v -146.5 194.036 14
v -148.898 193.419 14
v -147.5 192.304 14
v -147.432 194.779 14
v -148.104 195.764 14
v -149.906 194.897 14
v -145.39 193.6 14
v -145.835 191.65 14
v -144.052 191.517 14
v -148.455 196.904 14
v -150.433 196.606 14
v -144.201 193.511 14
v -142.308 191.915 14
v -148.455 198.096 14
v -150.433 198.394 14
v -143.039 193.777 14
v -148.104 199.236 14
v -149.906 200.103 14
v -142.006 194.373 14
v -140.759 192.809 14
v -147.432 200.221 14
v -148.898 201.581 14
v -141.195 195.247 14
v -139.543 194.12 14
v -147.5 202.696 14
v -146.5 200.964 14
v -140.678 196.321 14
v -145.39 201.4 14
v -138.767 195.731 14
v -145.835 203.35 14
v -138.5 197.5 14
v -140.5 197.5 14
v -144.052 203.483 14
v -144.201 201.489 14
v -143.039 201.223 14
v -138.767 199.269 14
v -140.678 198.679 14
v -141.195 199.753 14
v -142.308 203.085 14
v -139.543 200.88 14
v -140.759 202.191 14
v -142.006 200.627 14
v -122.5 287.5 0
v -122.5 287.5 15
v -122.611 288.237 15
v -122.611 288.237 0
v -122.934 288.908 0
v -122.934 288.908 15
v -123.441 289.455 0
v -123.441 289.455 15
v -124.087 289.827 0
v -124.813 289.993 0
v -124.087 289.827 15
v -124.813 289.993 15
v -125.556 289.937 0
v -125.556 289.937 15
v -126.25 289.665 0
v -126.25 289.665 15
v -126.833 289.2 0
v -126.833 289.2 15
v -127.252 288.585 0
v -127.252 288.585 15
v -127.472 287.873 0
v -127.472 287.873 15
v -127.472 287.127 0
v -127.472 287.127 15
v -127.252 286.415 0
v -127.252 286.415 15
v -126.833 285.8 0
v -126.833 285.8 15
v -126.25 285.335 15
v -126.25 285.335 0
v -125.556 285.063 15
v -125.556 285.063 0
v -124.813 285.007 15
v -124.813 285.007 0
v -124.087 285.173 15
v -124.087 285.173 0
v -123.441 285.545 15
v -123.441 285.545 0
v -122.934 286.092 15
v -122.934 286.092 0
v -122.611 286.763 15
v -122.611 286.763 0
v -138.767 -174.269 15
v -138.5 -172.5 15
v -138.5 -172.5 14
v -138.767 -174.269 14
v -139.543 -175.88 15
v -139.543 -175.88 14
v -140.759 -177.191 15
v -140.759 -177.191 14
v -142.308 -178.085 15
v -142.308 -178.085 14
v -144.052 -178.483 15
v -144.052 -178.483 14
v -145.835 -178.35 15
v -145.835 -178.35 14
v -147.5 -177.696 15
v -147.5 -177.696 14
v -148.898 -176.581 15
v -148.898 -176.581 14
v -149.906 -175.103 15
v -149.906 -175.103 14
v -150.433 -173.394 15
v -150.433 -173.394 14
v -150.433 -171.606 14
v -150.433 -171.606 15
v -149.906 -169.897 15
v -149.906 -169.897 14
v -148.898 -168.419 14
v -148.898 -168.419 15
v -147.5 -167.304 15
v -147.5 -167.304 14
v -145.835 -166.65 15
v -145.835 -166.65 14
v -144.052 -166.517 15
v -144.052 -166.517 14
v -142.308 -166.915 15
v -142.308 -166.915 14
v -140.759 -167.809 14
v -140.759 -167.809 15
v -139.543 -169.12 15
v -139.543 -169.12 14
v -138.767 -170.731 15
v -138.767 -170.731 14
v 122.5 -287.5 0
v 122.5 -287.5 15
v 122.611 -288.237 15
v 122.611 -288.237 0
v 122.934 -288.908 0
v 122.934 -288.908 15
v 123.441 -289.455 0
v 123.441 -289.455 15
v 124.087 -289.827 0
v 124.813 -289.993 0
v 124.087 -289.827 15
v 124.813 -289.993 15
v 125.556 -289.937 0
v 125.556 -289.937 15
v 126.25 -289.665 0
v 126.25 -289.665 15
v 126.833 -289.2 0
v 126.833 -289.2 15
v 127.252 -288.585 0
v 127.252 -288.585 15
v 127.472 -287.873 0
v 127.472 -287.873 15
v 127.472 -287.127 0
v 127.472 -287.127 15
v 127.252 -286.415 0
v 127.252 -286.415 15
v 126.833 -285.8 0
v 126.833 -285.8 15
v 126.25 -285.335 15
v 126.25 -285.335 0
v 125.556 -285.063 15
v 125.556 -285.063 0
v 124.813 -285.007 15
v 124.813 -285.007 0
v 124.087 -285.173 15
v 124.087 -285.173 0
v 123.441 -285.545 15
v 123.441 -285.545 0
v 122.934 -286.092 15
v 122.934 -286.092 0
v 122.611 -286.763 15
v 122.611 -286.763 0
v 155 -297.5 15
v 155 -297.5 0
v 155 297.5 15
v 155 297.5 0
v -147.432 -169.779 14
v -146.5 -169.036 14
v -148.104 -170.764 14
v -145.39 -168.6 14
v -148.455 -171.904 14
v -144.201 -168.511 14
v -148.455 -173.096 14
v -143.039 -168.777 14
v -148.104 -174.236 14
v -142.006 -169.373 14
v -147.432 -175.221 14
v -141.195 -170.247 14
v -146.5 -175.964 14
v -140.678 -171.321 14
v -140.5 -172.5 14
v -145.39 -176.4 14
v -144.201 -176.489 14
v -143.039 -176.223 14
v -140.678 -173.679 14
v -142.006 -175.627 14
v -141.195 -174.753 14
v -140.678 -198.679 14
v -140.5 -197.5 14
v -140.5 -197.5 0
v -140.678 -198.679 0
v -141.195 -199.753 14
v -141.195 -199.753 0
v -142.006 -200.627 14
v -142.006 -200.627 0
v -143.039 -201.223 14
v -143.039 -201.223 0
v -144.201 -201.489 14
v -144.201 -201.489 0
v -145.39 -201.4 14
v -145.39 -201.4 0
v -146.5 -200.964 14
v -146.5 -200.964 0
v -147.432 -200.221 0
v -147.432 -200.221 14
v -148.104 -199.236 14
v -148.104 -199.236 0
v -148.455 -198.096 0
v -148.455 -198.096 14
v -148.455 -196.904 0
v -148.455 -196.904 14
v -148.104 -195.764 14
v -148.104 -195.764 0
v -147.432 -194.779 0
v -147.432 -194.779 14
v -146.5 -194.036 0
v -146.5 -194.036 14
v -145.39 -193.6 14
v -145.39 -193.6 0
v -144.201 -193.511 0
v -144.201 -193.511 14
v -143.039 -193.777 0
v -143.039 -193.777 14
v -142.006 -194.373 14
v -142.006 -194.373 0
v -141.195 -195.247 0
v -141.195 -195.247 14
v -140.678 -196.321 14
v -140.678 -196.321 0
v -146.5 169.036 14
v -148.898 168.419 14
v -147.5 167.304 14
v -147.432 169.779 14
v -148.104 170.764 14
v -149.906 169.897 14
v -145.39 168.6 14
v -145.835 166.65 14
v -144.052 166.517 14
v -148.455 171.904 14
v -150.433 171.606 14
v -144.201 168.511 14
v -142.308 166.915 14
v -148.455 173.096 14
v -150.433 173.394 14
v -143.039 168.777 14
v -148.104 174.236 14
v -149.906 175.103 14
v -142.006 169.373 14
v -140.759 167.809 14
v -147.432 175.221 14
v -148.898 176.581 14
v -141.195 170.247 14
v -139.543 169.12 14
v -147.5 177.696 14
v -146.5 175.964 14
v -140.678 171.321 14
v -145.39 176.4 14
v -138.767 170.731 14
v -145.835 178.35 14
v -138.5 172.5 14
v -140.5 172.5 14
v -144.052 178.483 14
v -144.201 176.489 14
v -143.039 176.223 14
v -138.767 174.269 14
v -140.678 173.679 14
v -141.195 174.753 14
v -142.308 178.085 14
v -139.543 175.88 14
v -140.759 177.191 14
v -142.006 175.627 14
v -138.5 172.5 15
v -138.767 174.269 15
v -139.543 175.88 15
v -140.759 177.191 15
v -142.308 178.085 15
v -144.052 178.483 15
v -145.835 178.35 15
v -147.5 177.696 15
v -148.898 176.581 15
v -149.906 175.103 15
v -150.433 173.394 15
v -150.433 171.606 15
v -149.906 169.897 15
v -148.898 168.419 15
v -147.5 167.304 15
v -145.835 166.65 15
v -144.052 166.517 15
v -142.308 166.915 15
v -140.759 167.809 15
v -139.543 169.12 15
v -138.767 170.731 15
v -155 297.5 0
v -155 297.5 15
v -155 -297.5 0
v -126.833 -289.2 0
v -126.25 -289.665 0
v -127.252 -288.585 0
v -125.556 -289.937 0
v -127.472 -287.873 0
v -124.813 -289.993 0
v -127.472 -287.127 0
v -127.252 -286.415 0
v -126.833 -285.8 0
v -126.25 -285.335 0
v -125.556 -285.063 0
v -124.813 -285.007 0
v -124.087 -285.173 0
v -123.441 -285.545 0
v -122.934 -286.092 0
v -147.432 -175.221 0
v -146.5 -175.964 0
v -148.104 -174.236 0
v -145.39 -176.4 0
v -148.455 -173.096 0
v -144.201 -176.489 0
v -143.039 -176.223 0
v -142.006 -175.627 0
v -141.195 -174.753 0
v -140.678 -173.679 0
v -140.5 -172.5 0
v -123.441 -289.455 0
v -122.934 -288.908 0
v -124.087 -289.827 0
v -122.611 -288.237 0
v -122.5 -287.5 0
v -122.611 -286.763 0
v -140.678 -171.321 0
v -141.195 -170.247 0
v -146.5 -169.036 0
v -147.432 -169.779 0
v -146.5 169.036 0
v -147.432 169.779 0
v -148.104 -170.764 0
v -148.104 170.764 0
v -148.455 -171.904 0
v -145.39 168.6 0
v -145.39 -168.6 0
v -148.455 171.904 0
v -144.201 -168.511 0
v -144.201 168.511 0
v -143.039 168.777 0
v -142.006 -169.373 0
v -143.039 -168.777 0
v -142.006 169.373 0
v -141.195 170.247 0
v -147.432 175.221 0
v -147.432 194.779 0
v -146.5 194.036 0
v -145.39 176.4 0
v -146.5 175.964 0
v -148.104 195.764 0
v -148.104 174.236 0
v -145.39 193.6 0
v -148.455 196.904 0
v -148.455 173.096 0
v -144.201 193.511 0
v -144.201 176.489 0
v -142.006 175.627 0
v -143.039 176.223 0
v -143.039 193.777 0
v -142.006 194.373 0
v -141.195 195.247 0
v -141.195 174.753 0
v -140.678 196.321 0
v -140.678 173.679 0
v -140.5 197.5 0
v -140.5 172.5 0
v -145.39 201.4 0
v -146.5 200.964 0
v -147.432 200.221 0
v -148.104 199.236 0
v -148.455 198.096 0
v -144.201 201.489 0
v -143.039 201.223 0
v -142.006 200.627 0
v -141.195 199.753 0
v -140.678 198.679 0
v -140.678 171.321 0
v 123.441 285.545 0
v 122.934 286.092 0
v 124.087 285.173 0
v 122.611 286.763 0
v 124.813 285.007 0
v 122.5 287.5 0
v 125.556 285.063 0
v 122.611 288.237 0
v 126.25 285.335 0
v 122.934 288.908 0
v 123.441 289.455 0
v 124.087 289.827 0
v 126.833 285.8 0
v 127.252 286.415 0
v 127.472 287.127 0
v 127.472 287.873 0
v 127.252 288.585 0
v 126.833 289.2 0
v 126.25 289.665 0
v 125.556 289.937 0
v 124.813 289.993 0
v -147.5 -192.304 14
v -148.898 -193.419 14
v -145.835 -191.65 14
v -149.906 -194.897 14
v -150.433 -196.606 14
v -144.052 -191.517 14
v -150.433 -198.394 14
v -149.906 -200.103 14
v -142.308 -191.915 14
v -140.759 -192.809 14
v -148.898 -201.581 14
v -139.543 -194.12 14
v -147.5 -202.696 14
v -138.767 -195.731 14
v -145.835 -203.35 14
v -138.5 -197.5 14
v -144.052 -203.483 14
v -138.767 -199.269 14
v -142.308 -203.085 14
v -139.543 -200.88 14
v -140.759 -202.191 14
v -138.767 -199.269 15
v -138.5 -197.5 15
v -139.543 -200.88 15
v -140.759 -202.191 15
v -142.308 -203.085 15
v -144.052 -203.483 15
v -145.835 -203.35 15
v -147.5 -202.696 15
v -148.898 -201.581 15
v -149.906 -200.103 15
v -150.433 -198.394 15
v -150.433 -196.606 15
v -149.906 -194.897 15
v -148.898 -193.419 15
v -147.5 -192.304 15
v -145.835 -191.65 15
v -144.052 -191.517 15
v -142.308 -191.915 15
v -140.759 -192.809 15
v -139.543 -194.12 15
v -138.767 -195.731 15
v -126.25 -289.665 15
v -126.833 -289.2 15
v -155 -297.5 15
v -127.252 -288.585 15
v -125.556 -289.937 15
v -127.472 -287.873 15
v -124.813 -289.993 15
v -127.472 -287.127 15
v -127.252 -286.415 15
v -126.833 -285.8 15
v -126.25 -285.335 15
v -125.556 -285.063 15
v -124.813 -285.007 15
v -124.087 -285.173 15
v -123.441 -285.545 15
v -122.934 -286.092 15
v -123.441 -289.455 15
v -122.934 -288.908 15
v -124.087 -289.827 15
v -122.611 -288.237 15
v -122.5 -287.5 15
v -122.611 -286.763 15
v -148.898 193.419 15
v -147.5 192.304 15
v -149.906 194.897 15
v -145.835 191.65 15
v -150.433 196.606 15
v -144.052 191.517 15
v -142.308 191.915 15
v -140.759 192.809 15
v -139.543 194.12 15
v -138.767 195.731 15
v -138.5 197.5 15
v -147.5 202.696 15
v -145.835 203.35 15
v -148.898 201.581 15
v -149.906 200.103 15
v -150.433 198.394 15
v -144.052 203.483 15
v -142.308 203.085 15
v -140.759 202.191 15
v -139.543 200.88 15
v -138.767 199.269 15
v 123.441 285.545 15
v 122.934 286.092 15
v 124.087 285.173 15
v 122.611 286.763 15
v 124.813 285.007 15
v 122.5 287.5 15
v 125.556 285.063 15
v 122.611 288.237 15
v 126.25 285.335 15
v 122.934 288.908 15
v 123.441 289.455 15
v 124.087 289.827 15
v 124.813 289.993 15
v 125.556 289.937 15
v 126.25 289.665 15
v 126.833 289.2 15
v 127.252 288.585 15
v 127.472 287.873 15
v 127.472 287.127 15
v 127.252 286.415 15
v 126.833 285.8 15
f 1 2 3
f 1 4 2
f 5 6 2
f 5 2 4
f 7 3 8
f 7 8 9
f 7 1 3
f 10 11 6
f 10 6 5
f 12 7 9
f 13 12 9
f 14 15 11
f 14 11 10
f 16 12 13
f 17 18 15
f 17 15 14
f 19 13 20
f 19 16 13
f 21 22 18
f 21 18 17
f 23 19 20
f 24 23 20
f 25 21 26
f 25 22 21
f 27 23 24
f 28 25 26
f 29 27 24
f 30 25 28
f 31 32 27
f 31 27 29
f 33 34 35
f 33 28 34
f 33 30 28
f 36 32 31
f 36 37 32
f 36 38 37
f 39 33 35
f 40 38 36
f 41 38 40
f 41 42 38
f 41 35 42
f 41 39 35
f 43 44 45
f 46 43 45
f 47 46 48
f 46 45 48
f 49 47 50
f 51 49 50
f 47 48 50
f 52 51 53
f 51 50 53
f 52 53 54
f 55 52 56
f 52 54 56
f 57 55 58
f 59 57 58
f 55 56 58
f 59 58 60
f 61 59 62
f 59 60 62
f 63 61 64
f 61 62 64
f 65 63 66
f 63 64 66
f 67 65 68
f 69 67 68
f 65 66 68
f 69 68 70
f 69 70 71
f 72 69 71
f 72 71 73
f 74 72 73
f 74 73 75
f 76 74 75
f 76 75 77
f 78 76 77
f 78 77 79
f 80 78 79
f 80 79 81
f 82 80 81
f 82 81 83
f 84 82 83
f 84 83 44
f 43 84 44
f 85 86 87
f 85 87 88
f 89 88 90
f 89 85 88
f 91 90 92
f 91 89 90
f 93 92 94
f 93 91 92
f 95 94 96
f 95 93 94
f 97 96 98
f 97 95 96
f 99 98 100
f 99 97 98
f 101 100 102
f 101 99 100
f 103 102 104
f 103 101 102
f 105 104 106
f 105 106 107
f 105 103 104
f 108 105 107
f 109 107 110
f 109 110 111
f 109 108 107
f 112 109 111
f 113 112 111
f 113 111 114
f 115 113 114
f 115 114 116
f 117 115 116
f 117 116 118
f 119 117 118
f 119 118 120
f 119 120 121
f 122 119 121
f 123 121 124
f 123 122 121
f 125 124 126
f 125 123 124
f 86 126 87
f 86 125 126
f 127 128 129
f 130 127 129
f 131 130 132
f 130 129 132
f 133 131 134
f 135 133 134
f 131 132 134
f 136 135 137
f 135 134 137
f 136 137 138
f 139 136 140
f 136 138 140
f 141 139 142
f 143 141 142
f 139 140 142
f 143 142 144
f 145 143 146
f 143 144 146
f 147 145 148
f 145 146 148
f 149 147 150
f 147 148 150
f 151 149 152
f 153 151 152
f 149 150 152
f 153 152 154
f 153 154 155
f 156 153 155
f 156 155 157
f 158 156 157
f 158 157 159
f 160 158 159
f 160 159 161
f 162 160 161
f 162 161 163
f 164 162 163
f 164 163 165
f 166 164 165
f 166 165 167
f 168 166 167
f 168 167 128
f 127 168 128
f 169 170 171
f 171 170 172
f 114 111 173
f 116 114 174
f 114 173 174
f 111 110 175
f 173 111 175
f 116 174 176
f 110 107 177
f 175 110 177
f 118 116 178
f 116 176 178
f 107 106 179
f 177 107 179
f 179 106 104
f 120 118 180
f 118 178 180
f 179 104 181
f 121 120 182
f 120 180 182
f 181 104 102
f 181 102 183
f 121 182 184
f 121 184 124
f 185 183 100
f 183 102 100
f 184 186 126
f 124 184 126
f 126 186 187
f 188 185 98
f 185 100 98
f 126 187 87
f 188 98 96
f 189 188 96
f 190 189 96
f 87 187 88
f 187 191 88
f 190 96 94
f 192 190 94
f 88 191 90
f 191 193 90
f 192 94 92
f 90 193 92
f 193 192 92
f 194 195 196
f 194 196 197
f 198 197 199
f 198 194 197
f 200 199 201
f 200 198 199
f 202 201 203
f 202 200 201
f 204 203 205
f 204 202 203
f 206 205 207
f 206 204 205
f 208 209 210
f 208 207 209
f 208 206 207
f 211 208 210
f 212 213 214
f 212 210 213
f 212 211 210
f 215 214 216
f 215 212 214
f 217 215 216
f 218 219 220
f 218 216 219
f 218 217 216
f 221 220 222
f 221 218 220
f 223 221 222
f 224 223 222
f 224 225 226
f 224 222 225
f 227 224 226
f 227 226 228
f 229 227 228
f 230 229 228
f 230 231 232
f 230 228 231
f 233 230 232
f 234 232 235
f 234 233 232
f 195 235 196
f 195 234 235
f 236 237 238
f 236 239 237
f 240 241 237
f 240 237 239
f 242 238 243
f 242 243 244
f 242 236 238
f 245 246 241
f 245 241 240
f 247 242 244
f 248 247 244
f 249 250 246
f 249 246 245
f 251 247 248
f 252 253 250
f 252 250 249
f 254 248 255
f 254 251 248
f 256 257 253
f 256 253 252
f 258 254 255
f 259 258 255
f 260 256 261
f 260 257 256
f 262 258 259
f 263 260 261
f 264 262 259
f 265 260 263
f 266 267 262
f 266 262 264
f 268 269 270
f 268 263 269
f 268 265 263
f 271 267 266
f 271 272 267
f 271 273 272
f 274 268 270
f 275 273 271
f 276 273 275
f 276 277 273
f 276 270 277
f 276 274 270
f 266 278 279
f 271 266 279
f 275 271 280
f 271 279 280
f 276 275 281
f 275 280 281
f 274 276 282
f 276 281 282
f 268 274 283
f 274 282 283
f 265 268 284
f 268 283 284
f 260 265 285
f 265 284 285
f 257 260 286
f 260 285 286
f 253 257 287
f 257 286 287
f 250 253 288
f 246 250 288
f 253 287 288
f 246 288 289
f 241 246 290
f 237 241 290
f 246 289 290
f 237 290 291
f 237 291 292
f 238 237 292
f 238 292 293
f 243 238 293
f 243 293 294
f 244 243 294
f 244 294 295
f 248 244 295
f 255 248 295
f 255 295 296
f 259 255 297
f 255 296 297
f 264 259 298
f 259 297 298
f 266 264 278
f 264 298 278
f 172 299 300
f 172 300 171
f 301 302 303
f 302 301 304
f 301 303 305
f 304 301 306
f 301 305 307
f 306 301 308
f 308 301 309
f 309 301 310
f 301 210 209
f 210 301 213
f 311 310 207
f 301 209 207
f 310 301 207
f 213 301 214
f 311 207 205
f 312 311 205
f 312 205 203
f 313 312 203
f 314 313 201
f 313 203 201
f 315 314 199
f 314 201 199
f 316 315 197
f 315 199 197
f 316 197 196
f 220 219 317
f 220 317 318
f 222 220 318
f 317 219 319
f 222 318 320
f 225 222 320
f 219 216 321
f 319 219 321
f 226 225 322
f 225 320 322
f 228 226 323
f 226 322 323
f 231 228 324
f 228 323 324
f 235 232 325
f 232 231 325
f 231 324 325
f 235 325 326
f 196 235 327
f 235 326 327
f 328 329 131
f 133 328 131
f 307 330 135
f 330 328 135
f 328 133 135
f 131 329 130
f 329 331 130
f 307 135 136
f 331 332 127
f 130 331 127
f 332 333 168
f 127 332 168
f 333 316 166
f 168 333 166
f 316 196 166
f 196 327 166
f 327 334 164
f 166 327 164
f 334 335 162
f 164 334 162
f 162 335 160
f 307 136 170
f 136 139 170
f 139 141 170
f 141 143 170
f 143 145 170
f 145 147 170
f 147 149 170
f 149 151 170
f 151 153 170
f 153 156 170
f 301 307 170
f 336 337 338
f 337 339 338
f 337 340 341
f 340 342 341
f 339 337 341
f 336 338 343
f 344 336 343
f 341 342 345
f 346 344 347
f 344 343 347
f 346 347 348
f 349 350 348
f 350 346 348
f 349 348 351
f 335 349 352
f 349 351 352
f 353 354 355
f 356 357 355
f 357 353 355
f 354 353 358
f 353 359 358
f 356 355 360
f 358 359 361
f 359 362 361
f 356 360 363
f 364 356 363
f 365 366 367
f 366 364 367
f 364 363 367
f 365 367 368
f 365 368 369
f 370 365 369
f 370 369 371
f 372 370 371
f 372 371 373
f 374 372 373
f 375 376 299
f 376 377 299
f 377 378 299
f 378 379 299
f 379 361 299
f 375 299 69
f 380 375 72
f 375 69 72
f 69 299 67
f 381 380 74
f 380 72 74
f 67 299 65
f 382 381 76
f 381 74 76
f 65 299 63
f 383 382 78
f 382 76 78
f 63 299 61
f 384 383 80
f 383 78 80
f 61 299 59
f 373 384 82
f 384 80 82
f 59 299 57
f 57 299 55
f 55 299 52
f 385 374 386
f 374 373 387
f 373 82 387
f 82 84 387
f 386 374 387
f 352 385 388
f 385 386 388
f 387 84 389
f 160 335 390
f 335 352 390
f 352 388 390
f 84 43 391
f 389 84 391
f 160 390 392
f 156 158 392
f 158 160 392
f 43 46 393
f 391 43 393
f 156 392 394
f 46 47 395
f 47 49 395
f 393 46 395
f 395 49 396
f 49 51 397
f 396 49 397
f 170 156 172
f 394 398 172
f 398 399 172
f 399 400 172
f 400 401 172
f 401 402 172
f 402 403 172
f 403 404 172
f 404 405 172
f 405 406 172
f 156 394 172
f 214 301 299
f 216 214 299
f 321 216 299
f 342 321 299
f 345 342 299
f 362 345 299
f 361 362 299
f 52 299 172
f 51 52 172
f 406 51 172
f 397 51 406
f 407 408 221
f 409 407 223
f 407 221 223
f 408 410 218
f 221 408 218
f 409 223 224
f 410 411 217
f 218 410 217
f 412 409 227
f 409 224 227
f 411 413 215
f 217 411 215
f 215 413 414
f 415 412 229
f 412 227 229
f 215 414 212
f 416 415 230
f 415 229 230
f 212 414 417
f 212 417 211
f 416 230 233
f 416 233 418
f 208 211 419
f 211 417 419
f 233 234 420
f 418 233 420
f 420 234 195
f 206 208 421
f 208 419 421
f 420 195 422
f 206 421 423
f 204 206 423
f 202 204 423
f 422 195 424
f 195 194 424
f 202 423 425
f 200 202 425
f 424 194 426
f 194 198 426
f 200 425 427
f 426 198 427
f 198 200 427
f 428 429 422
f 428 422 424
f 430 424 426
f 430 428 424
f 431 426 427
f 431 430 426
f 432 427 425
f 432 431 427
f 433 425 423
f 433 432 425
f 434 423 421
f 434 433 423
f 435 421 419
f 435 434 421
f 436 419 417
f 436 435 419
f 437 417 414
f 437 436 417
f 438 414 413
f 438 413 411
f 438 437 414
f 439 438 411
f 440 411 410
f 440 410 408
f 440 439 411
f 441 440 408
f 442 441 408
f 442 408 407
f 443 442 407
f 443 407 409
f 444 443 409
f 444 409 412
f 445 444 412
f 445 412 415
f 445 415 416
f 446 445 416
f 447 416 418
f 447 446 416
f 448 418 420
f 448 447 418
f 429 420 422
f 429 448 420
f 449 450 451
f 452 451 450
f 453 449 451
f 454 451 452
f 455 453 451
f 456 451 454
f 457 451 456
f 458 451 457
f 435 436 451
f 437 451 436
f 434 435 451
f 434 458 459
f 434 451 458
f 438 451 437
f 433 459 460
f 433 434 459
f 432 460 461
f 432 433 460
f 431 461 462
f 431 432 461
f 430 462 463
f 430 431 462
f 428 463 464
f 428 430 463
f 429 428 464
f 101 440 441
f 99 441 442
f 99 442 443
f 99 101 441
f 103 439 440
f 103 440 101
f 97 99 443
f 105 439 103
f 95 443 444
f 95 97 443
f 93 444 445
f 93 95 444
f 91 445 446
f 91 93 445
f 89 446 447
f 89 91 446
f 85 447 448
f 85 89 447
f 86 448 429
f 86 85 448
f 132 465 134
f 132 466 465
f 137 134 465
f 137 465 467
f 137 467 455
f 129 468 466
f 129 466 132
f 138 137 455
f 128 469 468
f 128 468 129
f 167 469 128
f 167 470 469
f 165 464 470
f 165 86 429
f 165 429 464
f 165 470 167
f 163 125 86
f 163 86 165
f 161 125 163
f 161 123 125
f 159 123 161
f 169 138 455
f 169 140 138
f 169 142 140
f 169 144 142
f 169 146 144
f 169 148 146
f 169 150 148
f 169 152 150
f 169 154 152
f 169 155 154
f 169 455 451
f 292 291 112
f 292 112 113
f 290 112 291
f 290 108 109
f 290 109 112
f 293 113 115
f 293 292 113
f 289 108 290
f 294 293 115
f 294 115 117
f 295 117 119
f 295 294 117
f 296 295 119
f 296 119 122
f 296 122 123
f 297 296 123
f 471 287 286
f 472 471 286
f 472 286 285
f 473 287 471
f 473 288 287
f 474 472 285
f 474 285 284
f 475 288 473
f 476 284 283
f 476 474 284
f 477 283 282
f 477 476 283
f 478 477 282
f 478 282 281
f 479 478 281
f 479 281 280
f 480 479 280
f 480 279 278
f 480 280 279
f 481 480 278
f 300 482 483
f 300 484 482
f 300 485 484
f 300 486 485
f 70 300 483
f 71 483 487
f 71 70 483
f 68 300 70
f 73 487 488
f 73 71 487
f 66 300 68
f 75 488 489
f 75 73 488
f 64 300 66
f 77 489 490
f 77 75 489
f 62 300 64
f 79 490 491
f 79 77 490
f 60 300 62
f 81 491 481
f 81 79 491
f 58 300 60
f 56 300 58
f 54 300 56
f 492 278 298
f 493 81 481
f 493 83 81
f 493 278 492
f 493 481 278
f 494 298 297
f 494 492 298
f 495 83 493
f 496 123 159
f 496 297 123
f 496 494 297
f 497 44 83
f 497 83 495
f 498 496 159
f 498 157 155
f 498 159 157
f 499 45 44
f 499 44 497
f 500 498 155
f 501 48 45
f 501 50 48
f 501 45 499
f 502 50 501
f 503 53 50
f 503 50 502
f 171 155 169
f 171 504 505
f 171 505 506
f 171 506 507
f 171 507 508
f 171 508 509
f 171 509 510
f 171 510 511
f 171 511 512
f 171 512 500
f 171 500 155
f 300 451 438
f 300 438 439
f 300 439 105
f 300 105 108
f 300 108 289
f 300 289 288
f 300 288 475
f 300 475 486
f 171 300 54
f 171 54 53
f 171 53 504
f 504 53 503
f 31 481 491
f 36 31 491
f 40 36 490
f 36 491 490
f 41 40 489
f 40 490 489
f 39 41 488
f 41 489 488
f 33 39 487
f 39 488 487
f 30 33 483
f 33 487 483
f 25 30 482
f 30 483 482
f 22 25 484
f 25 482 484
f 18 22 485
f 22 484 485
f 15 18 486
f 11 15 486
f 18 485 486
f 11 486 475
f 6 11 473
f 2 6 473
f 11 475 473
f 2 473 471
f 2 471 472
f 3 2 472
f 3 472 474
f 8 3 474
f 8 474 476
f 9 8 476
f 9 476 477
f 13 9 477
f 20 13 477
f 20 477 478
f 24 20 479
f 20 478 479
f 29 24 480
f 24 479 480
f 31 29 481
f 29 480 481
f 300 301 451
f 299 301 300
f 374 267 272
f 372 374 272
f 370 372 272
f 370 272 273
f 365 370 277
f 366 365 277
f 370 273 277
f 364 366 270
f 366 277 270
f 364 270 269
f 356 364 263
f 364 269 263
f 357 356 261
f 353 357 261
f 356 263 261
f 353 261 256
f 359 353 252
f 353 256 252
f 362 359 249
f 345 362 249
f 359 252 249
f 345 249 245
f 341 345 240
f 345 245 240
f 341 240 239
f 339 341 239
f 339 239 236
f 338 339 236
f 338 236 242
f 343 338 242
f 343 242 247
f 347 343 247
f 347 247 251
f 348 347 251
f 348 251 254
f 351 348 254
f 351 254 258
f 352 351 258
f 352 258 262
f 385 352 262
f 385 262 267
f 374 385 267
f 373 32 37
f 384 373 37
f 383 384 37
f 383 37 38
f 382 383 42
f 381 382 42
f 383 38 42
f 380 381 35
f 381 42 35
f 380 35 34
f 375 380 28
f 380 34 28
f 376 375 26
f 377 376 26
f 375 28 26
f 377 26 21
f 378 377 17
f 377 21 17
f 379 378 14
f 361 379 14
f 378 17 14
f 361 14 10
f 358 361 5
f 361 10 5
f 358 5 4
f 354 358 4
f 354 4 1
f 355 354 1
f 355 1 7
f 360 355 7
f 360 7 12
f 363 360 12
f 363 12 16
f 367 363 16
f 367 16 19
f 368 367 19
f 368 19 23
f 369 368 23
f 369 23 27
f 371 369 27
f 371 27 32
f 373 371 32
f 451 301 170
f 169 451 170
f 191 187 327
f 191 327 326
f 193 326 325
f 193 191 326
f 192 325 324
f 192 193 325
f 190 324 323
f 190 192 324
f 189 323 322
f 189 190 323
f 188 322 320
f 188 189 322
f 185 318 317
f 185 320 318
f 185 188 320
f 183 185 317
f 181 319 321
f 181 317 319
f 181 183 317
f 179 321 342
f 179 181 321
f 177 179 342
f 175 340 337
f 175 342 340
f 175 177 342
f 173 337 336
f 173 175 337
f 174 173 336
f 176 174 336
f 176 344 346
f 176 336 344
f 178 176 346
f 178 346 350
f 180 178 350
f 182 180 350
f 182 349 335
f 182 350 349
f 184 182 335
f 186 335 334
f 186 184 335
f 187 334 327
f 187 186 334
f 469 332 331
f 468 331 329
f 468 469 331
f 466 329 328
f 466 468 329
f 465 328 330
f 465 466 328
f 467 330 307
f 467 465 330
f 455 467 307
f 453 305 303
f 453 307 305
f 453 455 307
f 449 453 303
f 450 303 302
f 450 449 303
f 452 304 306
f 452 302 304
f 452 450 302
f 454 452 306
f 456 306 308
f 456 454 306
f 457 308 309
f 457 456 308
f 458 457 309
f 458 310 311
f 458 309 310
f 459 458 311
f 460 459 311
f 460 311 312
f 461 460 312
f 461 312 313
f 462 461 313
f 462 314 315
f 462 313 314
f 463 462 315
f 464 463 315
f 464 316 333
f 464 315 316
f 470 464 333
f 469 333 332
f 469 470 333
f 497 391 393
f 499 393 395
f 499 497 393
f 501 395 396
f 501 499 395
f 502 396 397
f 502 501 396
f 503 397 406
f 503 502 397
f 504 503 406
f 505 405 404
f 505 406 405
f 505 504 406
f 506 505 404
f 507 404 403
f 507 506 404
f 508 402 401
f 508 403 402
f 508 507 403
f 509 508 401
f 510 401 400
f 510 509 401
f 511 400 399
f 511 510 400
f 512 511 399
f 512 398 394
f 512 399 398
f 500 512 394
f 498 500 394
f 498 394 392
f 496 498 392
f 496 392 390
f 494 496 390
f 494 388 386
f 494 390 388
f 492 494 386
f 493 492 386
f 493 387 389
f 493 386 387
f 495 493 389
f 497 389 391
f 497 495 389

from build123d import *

# Parameters (mm, degrees)
SKETCH_1_W               = 310
SKETCH_1_H               = 595
EXTRUDE_1_DEPTH          = 15
SKETCH_2_R               = 4
CUT_EXTRUDE_2_DEPTH      = 336.791974294
SKETCH_2_5_R             = 2.5
CUT_EXTRUDE_3_DEPTH      = 336.791974294
MIRROR_3_COPY_1_SKETCH_R = 2.5
MIRROR_3_COPY_1_DEPTH    = 336.791974294
MIRROR_3_COPY_2_SKETCH_R = 2.5
MIRROR_3_COPY_2_DEPTH    = 336.791974294
SKETCH_3_R               = 6
CUT_EXTRUDE_4_DEPTH      = 1


with BuildPart() as part:
    # ｽｹｯﾁ1 → ﾎﾞｽ - 押し出し1 (new body)
    with BuildSketch(Plane.XY):
        Rectangle(SKETCH_1_W, SKETCH_1_H)
    extrude(amount=EXTRUDE_1_DEPTH)

    # ｽｹｯﾁ2 → ｶｯﾄ - 押し出し2 (cut, through all)
    with BuildSketch(Plane.XY.offset(15)):
        with Locations((-144.5, 197.5)):
            Circle(SKETCH_2_R)
        with Locations((-144.5, 172.5)):
            Circle(SKETCH_2_R)
    cut_extrude_2 = extrude(amount=-CUT_EXTRUDE_2_DEPTH, mode=Mode.SUBTRACT)

    # ｽｹｯﾁ2<5> → ｶｯﾄ - 押し出し3 (cut, through all)
    with BuildSketch(Plane.XY.offset(15)):
        with Locations((-125, 287.5)):
            Circle(SKETCH_2_5_R)
    cut_extrude_3 = extrude(amount=-CUT_EXTRUDE_3_DEPTH, mode=Mode.SUBTRACT)

    # ﾐﾗｰ1: ｶｯﾄ - 押し出し3 across plane
    add(cut_extrude_3.mirror(Plane.ZX), mode=Mode.SUBTRACT)

    # ﾐﾗｰ2: ｶｯﾄ - 押し出し2 across plane
    add(cut_extrude_2.mirror(Plane.ZX), mode=Mode.SUBTRACT)

    # ﾐﾗｰ3 copy 1 sketch → ﾐﾗｰ3 copy 1 (cut, through all)
    with BuildSketch(Plane(origin=(0, 0, 15), x_dir=(-1, 0, 0), z_dir=(0, 0, 1))):
        with Locations((-125, 287.5)):
            Circle(MIRROR_3_COPY_1_SKETCH_R)
    extrude(amount=-MIRROR_3_COPY_1_DEPTH, mode=Mode.SUBTRACT)

    # ﾐﾗｰ3 copy 2 sketch → ﾐﾗｰ3 copy 2 (cut, through all)
    with BuildSketch(Plane(origin=(0, 0, 15), x_dir=(-1, 0, 0), z_dir=(0, 0, 1))):
        with Locations((-125, -287.5)):
            Circle(MIRROR_3_COPY_2_SKETCH_R)
    extrude(amount=-MIRROR_3_COPY_2_DEPTH, mode=Mode.SUBTRACT)

    # ｽｹｯﾁ3 → ｶｯﾄ - 押し出し4 (cut)
    with BuildSketch(Plane.XY.offset(15)):
        with Locations((-144.5, 197.5)):
            Circle(SKETCH_3_R)
        with Locations((-144.5, 172.5)):
            Circle(SKETCH_3_R)
    cut_extrude_4 = extrude(amount=-CUT_EXTRUDE_4_DEPTH, mode=Mode.SUBTRACT)

    # ﾐﾗｰ4: ｶｯﾄ - 押し出し4 across plane
    add(cut_extrude_4.mirror(Plane.ZX), mode=Mode.SUBTRACT)


solid = part.part
